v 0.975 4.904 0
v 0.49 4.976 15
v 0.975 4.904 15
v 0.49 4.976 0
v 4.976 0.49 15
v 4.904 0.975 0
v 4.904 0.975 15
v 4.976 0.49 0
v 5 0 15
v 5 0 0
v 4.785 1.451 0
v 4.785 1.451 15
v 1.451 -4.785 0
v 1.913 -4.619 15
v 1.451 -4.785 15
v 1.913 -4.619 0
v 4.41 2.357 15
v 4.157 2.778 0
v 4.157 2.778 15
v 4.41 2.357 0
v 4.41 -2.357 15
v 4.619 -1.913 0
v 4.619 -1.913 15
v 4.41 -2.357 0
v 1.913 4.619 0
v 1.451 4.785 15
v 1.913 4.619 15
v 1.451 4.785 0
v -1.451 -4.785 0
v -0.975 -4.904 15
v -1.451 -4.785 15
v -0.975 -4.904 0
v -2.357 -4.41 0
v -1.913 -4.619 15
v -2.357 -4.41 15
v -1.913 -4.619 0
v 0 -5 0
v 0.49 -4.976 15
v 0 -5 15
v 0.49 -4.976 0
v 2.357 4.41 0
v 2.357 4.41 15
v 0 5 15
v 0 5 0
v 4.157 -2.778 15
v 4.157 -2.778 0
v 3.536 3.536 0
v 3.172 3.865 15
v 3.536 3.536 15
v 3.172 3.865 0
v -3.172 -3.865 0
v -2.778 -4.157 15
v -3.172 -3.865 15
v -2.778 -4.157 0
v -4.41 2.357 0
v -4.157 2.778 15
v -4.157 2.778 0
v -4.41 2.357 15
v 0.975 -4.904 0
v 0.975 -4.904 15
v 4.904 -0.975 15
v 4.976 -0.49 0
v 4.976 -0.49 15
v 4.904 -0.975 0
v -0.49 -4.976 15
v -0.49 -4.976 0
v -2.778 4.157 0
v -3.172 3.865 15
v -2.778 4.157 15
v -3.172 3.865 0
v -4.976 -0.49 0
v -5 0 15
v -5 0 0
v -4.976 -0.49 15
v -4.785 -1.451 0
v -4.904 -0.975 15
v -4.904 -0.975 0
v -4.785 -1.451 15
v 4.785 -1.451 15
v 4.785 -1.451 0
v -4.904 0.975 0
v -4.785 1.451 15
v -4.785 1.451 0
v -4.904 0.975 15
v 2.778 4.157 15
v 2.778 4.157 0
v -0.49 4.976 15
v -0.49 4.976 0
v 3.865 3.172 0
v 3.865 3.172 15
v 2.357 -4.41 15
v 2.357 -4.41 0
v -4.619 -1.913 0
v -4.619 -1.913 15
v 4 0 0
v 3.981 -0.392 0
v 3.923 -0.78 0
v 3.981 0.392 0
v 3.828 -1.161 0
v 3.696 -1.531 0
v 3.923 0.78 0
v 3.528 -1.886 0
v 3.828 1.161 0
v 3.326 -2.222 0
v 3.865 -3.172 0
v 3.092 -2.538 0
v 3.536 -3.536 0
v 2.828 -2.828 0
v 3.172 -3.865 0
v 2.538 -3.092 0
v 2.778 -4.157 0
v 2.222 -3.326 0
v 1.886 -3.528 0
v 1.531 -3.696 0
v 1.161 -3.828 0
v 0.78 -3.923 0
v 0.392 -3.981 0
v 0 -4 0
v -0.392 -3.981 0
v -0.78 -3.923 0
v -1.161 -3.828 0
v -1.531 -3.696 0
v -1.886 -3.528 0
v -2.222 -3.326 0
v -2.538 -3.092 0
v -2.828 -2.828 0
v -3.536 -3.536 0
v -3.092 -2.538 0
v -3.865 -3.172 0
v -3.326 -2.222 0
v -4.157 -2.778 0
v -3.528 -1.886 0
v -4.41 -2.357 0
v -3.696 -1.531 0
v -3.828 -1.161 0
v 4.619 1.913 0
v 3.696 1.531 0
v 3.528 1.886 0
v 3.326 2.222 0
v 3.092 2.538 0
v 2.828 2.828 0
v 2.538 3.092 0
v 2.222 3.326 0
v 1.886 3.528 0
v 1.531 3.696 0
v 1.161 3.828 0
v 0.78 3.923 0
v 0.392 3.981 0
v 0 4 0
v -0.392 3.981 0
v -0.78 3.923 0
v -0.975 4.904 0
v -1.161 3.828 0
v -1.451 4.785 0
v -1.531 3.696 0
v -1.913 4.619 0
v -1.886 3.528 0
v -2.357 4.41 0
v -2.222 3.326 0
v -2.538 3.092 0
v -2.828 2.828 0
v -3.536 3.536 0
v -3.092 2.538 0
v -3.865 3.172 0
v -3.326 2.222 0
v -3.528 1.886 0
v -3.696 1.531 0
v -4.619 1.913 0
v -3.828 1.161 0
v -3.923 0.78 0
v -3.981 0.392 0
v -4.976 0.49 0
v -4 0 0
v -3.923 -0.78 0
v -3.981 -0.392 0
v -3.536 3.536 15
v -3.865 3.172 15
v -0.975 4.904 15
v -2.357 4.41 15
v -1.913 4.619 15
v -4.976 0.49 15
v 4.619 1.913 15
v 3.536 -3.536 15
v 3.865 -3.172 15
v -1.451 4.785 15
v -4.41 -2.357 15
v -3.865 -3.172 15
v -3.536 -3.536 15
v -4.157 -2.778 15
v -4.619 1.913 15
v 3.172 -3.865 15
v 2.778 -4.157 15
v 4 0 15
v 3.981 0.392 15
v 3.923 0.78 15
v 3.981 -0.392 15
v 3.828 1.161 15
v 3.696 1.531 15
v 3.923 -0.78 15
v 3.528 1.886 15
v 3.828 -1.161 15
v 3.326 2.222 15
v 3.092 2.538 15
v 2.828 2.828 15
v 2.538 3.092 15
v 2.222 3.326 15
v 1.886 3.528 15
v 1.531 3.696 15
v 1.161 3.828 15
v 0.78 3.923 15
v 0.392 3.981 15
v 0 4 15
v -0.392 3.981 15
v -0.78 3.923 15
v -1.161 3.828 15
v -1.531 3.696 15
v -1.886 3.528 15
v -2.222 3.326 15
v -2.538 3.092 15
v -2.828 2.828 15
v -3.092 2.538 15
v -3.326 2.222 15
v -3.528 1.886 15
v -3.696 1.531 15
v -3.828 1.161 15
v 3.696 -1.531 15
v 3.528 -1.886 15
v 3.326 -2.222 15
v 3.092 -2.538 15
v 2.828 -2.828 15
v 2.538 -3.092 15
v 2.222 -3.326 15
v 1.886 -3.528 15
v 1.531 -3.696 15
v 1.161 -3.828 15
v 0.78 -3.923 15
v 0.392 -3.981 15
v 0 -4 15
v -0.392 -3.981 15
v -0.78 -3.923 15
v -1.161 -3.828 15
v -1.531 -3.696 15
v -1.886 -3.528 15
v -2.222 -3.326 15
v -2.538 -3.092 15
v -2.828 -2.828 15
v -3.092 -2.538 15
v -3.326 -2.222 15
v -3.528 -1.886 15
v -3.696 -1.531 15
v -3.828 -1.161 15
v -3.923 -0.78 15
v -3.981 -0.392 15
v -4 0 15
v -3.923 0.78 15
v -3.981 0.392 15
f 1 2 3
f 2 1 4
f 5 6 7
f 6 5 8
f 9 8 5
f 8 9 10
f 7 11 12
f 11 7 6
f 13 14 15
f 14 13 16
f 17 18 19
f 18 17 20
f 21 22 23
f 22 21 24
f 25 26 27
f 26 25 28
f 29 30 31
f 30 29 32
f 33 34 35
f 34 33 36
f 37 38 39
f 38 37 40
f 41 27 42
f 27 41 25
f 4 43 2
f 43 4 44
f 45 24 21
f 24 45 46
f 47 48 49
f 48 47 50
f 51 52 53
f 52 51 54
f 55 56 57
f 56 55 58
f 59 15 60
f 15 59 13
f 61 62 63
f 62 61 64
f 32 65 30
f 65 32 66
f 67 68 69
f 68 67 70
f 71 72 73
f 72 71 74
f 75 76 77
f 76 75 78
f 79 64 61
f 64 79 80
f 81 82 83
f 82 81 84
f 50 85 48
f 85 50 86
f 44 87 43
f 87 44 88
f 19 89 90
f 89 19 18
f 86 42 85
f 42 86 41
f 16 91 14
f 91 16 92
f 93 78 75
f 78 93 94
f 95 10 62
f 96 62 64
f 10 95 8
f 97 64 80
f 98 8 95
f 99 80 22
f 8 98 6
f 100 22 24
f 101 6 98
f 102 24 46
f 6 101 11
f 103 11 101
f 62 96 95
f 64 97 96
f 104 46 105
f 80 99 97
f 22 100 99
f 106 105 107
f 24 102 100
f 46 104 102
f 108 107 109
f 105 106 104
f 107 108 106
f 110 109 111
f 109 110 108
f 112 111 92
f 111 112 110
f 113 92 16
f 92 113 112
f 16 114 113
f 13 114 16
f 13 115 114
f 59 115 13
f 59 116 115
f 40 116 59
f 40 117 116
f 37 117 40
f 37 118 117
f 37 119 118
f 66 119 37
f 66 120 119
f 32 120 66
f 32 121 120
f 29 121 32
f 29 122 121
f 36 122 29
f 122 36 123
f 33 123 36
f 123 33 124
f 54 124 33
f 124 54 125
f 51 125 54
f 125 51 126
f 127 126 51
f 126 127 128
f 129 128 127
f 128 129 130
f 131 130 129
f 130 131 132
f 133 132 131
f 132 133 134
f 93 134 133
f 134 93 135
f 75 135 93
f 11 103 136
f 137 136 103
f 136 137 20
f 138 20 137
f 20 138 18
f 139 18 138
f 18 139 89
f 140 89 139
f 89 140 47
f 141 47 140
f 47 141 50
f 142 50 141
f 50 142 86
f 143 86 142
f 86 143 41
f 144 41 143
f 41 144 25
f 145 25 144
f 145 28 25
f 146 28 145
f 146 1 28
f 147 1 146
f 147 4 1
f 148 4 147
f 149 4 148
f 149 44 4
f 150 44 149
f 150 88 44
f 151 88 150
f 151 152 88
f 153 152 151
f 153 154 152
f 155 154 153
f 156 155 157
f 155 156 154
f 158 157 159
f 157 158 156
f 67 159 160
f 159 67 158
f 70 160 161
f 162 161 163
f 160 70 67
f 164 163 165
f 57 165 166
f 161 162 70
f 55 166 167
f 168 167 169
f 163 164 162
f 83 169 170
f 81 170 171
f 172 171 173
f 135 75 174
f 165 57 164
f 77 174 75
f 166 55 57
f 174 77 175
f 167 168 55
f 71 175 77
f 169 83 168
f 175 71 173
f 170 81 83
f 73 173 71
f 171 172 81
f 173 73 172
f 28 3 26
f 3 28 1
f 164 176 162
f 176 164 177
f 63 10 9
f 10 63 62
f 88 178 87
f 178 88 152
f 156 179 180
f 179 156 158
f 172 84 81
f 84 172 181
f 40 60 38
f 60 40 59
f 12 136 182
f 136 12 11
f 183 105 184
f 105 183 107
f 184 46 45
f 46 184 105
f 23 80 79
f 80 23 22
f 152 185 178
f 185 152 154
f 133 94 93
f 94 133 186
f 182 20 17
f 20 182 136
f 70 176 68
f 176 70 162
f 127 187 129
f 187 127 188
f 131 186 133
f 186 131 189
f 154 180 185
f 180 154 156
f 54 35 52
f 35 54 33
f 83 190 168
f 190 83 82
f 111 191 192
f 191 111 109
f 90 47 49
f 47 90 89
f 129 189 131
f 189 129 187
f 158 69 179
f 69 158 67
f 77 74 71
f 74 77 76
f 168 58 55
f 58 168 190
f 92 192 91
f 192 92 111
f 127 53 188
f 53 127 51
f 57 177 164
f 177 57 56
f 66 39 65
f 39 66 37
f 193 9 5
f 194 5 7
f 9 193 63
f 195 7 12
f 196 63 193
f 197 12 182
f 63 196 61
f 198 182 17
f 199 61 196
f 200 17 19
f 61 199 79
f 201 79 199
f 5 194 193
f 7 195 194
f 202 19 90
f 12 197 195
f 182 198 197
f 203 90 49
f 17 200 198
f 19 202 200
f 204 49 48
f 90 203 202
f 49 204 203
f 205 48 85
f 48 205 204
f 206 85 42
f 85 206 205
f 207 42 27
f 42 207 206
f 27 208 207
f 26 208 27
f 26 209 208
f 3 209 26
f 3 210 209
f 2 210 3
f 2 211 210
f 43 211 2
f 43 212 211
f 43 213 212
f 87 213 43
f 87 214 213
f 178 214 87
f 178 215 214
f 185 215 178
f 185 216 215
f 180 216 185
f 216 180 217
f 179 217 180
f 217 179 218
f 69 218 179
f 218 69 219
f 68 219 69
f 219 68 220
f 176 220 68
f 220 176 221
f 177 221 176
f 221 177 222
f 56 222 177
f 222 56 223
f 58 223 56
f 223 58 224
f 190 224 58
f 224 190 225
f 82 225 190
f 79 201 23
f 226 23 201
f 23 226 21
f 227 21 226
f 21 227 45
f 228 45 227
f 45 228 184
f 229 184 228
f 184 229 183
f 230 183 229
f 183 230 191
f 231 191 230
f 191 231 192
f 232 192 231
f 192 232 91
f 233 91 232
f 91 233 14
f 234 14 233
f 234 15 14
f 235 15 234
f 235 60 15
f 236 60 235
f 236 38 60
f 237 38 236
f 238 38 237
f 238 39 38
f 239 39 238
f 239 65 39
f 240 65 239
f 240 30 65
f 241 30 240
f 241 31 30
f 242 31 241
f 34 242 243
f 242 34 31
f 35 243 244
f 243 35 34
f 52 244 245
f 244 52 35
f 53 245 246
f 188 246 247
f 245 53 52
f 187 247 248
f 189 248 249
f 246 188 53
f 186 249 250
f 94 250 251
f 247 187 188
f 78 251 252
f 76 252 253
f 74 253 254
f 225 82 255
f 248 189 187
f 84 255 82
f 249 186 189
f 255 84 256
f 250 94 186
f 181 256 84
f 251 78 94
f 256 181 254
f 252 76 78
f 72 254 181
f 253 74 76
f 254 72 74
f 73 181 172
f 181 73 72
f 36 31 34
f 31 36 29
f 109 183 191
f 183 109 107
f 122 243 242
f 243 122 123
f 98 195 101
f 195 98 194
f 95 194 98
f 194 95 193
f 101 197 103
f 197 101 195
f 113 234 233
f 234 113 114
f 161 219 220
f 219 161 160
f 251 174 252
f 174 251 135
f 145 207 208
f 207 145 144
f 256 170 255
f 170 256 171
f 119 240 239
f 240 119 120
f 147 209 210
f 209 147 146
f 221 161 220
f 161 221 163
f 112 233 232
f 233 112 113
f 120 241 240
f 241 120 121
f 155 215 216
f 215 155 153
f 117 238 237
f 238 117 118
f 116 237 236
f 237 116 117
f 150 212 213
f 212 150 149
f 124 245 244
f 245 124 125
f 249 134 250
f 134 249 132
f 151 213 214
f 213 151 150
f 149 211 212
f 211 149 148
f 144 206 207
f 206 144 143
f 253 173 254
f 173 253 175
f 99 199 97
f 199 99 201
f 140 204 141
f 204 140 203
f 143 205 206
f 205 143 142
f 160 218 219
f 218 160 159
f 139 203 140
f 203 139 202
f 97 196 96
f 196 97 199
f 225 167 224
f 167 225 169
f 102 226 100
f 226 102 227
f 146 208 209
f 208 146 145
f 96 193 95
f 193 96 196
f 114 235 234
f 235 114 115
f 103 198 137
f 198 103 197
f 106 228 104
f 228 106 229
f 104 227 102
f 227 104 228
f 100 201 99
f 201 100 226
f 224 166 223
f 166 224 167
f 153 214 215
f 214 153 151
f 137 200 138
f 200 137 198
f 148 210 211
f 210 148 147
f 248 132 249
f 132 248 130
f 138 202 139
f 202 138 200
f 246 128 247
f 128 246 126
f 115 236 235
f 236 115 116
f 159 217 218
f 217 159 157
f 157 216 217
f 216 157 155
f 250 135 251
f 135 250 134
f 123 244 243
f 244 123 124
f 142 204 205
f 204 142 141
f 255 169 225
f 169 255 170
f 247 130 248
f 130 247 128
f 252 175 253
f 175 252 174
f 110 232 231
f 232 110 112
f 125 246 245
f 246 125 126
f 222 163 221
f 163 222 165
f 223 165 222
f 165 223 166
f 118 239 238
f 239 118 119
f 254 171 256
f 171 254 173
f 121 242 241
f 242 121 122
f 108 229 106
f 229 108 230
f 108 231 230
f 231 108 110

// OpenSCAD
// Parameters
material = 0; //[0:0:1]
type = 0; //[0:10:1]
length = 15; //[8:30:1]
forced_id = 0; //[0:30:1]
center = 1; //[0:1:1]
path_enabled = 0; //[0:1:1]
type_od = 10; //[5:20:0.5]
type_id = 8; //[3:18:0.5]
id = 8; //[3:18:0.5]
od = 10; //[5:20:0.5]
eps_overlap = 0.8; //[0.2:2:0.1]
z_offset = 0; //[-50:50:1]

// Tubing - complete geometry
module tubing() {
  color([0.15, 0.15, 0.17]) {
    difference() {
      // Outer tube
      translate([0, 0, z_offset])
        cylinder(h=length, r=od/2, center=center, $fn=64);
      // Inner bore
      translate([0, 0, z_offset])
        cylinder(h=length + 2*eps_overlap, r=id/2, center=center, $fn=64);
    }
  }
}

// Assembly
module assembly() {
  tubing();
}

assembly();
